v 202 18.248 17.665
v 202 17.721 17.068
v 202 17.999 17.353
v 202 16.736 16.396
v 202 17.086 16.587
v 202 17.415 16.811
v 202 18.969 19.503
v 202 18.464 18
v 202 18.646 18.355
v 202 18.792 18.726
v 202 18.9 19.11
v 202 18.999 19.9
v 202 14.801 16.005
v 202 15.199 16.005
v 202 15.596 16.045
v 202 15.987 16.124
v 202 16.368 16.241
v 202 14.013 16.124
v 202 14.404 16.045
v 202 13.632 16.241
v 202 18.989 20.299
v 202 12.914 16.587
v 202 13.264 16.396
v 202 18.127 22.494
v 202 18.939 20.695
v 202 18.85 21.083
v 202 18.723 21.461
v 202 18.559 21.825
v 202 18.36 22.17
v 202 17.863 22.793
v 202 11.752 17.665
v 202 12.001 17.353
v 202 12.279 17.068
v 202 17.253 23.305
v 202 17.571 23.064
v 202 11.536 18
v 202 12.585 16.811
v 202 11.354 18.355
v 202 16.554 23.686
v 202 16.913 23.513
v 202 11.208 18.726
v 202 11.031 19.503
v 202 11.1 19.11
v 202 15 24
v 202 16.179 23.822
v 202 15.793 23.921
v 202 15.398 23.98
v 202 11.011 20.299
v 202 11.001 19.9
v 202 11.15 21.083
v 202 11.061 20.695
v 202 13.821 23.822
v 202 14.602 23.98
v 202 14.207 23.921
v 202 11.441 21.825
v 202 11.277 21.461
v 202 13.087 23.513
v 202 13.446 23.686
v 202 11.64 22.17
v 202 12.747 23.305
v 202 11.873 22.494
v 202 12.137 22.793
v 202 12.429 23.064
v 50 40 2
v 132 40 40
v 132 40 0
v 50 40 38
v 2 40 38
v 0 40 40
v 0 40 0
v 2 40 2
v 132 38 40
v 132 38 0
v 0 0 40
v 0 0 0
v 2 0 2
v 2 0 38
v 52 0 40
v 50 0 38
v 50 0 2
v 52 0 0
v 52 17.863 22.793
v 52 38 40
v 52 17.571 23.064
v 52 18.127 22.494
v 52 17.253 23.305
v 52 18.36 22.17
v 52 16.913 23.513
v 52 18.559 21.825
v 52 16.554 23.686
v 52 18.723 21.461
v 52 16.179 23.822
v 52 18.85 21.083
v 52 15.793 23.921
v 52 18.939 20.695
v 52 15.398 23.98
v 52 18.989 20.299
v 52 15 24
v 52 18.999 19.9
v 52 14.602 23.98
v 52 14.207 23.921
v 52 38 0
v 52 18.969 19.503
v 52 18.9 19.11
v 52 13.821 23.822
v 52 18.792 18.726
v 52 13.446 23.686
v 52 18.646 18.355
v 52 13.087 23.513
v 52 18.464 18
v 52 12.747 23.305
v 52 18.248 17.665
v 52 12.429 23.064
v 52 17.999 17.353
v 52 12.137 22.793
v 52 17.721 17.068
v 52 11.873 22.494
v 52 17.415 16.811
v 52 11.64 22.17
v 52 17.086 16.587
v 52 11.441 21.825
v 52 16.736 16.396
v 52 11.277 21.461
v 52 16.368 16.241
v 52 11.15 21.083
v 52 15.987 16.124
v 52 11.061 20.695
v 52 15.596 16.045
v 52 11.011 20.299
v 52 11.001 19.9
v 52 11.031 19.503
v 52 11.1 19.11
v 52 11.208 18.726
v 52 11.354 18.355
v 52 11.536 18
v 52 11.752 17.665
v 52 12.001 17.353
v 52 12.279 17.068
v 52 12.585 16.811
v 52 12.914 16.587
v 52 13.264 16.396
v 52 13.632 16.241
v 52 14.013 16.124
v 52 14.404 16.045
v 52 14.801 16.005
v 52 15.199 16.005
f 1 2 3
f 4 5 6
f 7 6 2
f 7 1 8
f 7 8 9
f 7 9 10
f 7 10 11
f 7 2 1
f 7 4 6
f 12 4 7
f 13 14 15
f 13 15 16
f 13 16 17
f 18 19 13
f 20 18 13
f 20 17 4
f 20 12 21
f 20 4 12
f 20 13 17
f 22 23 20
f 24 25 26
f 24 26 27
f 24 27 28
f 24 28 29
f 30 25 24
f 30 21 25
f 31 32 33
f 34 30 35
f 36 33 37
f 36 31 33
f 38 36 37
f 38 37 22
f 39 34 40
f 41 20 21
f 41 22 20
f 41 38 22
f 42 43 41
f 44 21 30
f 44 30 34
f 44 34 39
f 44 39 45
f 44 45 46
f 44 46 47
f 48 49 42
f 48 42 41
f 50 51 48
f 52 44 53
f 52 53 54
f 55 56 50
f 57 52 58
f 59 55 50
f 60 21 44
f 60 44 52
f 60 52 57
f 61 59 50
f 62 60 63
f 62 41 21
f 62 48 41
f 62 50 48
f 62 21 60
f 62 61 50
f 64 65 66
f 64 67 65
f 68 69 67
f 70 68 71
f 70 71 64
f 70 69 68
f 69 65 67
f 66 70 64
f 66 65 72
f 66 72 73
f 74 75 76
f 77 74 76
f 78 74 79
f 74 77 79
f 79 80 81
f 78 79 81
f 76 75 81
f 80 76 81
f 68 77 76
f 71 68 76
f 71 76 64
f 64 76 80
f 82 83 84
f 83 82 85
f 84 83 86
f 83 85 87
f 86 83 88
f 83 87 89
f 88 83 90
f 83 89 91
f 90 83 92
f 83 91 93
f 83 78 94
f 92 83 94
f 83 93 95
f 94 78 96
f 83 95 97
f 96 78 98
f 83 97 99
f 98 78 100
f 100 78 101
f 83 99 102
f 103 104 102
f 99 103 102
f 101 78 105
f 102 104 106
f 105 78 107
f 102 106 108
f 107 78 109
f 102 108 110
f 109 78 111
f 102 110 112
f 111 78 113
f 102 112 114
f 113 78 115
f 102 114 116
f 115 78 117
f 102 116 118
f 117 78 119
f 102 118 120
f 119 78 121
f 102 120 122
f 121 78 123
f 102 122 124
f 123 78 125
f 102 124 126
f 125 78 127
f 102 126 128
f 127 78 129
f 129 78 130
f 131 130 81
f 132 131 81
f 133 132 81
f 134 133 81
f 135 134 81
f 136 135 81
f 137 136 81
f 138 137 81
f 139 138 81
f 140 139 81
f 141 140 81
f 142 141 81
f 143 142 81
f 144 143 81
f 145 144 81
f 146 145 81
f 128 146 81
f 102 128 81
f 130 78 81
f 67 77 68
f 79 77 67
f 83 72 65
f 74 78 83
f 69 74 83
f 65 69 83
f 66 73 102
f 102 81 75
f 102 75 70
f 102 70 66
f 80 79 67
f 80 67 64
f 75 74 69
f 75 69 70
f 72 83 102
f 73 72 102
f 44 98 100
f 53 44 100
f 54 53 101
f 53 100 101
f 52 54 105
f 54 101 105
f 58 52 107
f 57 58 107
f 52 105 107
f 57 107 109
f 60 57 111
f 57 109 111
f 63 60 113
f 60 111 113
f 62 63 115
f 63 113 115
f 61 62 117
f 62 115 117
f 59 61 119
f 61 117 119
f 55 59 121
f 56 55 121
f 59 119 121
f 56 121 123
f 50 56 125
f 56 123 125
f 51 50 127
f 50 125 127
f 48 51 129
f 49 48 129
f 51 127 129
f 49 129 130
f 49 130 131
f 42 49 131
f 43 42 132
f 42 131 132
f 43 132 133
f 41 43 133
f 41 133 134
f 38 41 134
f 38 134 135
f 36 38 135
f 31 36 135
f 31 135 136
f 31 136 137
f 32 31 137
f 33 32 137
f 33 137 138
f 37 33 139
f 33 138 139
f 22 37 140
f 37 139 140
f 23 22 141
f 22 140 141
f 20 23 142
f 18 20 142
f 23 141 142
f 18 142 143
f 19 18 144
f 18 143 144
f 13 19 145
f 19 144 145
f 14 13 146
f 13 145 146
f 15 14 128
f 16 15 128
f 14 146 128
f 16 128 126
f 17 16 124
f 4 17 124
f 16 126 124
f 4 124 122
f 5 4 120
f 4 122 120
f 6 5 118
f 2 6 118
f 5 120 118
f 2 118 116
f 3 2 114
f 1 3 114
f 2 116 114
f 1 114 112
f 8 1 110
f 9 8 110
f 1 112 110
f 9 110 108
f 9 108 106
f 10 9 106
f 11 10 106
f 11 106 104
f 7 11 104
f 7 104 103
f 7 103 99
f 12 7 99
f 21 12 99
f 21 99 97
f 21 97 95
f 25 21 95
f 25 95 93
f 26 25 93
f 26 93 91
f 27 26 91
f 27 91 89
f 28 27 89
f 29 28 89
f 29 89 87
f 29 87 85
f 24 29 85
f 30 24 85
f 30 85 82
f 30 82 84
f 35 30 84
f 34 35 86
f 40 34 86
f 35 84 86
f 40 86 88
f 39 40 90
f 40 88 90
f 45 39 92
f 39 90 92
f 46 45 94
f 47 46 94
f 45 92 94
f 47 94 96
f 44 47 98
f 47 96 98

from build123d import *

# Parameters (mm, degrees)
SKETCH1_W           = 52
SKETCH1_H           = 40
SKETCH1_W_2         = 48
SKETCH1_H_2         = 36
BOSS_EXTRUDE1_DEPTH = 40
SKETCH2_W           = 40
SKETCH2_H           = 2
BOSS_EXTRUDE2_DEPTH = 80
SKETCH3_R           = 4
BOSS_EXTRUDE3_DEPTH = 150


with BuildPart() as part:
    # Sketch1 → Boss-Extrude1 (new body)
    with BuildSketch(Plane(origin=(0, 0, 0), x_dir=(1, 0, 0), z_dir=(0, 1, 0))):
        with Locations((26, -20)):
            Rectangle(SKETCH1_W, SKETCH1_H)
        with Locations((26, -20)):
            Rectangle(SKETCH1_W_2, SKETCH1_H_2, mode=Mode.SUBTRACT)
    extrude(amount=BOSS_EXTRUDE1_DEPTH)

    # Sketch2 → Boss-Extrude2 (add)
    with BuildSketch(Plane(origin=(52, 0, 0), x_dir=(0, 0, -1), z_dir=(1, 0, 0))):
        with Locations((-20, 39)):
            Rectangle(SKETCH2_W, SKETCH2_H)
    extrude(amount=BOSS_EXTRUDE2_DEPTH)

    # Sketch3 → Boss-Extrude3 (add)
    with BuildSketch(Plane(origin=(52, 0, 0), x_dir=(0, 0, -1), z_dir=(1, 0, 0))):
        with Locations(Location((-20, 15, 0), (0, 0, 180))):
            Circle(SKETCH3_R)
    extrude(amount=BOSS_EXTRUDE3_DEPTH)


solid = part.part
